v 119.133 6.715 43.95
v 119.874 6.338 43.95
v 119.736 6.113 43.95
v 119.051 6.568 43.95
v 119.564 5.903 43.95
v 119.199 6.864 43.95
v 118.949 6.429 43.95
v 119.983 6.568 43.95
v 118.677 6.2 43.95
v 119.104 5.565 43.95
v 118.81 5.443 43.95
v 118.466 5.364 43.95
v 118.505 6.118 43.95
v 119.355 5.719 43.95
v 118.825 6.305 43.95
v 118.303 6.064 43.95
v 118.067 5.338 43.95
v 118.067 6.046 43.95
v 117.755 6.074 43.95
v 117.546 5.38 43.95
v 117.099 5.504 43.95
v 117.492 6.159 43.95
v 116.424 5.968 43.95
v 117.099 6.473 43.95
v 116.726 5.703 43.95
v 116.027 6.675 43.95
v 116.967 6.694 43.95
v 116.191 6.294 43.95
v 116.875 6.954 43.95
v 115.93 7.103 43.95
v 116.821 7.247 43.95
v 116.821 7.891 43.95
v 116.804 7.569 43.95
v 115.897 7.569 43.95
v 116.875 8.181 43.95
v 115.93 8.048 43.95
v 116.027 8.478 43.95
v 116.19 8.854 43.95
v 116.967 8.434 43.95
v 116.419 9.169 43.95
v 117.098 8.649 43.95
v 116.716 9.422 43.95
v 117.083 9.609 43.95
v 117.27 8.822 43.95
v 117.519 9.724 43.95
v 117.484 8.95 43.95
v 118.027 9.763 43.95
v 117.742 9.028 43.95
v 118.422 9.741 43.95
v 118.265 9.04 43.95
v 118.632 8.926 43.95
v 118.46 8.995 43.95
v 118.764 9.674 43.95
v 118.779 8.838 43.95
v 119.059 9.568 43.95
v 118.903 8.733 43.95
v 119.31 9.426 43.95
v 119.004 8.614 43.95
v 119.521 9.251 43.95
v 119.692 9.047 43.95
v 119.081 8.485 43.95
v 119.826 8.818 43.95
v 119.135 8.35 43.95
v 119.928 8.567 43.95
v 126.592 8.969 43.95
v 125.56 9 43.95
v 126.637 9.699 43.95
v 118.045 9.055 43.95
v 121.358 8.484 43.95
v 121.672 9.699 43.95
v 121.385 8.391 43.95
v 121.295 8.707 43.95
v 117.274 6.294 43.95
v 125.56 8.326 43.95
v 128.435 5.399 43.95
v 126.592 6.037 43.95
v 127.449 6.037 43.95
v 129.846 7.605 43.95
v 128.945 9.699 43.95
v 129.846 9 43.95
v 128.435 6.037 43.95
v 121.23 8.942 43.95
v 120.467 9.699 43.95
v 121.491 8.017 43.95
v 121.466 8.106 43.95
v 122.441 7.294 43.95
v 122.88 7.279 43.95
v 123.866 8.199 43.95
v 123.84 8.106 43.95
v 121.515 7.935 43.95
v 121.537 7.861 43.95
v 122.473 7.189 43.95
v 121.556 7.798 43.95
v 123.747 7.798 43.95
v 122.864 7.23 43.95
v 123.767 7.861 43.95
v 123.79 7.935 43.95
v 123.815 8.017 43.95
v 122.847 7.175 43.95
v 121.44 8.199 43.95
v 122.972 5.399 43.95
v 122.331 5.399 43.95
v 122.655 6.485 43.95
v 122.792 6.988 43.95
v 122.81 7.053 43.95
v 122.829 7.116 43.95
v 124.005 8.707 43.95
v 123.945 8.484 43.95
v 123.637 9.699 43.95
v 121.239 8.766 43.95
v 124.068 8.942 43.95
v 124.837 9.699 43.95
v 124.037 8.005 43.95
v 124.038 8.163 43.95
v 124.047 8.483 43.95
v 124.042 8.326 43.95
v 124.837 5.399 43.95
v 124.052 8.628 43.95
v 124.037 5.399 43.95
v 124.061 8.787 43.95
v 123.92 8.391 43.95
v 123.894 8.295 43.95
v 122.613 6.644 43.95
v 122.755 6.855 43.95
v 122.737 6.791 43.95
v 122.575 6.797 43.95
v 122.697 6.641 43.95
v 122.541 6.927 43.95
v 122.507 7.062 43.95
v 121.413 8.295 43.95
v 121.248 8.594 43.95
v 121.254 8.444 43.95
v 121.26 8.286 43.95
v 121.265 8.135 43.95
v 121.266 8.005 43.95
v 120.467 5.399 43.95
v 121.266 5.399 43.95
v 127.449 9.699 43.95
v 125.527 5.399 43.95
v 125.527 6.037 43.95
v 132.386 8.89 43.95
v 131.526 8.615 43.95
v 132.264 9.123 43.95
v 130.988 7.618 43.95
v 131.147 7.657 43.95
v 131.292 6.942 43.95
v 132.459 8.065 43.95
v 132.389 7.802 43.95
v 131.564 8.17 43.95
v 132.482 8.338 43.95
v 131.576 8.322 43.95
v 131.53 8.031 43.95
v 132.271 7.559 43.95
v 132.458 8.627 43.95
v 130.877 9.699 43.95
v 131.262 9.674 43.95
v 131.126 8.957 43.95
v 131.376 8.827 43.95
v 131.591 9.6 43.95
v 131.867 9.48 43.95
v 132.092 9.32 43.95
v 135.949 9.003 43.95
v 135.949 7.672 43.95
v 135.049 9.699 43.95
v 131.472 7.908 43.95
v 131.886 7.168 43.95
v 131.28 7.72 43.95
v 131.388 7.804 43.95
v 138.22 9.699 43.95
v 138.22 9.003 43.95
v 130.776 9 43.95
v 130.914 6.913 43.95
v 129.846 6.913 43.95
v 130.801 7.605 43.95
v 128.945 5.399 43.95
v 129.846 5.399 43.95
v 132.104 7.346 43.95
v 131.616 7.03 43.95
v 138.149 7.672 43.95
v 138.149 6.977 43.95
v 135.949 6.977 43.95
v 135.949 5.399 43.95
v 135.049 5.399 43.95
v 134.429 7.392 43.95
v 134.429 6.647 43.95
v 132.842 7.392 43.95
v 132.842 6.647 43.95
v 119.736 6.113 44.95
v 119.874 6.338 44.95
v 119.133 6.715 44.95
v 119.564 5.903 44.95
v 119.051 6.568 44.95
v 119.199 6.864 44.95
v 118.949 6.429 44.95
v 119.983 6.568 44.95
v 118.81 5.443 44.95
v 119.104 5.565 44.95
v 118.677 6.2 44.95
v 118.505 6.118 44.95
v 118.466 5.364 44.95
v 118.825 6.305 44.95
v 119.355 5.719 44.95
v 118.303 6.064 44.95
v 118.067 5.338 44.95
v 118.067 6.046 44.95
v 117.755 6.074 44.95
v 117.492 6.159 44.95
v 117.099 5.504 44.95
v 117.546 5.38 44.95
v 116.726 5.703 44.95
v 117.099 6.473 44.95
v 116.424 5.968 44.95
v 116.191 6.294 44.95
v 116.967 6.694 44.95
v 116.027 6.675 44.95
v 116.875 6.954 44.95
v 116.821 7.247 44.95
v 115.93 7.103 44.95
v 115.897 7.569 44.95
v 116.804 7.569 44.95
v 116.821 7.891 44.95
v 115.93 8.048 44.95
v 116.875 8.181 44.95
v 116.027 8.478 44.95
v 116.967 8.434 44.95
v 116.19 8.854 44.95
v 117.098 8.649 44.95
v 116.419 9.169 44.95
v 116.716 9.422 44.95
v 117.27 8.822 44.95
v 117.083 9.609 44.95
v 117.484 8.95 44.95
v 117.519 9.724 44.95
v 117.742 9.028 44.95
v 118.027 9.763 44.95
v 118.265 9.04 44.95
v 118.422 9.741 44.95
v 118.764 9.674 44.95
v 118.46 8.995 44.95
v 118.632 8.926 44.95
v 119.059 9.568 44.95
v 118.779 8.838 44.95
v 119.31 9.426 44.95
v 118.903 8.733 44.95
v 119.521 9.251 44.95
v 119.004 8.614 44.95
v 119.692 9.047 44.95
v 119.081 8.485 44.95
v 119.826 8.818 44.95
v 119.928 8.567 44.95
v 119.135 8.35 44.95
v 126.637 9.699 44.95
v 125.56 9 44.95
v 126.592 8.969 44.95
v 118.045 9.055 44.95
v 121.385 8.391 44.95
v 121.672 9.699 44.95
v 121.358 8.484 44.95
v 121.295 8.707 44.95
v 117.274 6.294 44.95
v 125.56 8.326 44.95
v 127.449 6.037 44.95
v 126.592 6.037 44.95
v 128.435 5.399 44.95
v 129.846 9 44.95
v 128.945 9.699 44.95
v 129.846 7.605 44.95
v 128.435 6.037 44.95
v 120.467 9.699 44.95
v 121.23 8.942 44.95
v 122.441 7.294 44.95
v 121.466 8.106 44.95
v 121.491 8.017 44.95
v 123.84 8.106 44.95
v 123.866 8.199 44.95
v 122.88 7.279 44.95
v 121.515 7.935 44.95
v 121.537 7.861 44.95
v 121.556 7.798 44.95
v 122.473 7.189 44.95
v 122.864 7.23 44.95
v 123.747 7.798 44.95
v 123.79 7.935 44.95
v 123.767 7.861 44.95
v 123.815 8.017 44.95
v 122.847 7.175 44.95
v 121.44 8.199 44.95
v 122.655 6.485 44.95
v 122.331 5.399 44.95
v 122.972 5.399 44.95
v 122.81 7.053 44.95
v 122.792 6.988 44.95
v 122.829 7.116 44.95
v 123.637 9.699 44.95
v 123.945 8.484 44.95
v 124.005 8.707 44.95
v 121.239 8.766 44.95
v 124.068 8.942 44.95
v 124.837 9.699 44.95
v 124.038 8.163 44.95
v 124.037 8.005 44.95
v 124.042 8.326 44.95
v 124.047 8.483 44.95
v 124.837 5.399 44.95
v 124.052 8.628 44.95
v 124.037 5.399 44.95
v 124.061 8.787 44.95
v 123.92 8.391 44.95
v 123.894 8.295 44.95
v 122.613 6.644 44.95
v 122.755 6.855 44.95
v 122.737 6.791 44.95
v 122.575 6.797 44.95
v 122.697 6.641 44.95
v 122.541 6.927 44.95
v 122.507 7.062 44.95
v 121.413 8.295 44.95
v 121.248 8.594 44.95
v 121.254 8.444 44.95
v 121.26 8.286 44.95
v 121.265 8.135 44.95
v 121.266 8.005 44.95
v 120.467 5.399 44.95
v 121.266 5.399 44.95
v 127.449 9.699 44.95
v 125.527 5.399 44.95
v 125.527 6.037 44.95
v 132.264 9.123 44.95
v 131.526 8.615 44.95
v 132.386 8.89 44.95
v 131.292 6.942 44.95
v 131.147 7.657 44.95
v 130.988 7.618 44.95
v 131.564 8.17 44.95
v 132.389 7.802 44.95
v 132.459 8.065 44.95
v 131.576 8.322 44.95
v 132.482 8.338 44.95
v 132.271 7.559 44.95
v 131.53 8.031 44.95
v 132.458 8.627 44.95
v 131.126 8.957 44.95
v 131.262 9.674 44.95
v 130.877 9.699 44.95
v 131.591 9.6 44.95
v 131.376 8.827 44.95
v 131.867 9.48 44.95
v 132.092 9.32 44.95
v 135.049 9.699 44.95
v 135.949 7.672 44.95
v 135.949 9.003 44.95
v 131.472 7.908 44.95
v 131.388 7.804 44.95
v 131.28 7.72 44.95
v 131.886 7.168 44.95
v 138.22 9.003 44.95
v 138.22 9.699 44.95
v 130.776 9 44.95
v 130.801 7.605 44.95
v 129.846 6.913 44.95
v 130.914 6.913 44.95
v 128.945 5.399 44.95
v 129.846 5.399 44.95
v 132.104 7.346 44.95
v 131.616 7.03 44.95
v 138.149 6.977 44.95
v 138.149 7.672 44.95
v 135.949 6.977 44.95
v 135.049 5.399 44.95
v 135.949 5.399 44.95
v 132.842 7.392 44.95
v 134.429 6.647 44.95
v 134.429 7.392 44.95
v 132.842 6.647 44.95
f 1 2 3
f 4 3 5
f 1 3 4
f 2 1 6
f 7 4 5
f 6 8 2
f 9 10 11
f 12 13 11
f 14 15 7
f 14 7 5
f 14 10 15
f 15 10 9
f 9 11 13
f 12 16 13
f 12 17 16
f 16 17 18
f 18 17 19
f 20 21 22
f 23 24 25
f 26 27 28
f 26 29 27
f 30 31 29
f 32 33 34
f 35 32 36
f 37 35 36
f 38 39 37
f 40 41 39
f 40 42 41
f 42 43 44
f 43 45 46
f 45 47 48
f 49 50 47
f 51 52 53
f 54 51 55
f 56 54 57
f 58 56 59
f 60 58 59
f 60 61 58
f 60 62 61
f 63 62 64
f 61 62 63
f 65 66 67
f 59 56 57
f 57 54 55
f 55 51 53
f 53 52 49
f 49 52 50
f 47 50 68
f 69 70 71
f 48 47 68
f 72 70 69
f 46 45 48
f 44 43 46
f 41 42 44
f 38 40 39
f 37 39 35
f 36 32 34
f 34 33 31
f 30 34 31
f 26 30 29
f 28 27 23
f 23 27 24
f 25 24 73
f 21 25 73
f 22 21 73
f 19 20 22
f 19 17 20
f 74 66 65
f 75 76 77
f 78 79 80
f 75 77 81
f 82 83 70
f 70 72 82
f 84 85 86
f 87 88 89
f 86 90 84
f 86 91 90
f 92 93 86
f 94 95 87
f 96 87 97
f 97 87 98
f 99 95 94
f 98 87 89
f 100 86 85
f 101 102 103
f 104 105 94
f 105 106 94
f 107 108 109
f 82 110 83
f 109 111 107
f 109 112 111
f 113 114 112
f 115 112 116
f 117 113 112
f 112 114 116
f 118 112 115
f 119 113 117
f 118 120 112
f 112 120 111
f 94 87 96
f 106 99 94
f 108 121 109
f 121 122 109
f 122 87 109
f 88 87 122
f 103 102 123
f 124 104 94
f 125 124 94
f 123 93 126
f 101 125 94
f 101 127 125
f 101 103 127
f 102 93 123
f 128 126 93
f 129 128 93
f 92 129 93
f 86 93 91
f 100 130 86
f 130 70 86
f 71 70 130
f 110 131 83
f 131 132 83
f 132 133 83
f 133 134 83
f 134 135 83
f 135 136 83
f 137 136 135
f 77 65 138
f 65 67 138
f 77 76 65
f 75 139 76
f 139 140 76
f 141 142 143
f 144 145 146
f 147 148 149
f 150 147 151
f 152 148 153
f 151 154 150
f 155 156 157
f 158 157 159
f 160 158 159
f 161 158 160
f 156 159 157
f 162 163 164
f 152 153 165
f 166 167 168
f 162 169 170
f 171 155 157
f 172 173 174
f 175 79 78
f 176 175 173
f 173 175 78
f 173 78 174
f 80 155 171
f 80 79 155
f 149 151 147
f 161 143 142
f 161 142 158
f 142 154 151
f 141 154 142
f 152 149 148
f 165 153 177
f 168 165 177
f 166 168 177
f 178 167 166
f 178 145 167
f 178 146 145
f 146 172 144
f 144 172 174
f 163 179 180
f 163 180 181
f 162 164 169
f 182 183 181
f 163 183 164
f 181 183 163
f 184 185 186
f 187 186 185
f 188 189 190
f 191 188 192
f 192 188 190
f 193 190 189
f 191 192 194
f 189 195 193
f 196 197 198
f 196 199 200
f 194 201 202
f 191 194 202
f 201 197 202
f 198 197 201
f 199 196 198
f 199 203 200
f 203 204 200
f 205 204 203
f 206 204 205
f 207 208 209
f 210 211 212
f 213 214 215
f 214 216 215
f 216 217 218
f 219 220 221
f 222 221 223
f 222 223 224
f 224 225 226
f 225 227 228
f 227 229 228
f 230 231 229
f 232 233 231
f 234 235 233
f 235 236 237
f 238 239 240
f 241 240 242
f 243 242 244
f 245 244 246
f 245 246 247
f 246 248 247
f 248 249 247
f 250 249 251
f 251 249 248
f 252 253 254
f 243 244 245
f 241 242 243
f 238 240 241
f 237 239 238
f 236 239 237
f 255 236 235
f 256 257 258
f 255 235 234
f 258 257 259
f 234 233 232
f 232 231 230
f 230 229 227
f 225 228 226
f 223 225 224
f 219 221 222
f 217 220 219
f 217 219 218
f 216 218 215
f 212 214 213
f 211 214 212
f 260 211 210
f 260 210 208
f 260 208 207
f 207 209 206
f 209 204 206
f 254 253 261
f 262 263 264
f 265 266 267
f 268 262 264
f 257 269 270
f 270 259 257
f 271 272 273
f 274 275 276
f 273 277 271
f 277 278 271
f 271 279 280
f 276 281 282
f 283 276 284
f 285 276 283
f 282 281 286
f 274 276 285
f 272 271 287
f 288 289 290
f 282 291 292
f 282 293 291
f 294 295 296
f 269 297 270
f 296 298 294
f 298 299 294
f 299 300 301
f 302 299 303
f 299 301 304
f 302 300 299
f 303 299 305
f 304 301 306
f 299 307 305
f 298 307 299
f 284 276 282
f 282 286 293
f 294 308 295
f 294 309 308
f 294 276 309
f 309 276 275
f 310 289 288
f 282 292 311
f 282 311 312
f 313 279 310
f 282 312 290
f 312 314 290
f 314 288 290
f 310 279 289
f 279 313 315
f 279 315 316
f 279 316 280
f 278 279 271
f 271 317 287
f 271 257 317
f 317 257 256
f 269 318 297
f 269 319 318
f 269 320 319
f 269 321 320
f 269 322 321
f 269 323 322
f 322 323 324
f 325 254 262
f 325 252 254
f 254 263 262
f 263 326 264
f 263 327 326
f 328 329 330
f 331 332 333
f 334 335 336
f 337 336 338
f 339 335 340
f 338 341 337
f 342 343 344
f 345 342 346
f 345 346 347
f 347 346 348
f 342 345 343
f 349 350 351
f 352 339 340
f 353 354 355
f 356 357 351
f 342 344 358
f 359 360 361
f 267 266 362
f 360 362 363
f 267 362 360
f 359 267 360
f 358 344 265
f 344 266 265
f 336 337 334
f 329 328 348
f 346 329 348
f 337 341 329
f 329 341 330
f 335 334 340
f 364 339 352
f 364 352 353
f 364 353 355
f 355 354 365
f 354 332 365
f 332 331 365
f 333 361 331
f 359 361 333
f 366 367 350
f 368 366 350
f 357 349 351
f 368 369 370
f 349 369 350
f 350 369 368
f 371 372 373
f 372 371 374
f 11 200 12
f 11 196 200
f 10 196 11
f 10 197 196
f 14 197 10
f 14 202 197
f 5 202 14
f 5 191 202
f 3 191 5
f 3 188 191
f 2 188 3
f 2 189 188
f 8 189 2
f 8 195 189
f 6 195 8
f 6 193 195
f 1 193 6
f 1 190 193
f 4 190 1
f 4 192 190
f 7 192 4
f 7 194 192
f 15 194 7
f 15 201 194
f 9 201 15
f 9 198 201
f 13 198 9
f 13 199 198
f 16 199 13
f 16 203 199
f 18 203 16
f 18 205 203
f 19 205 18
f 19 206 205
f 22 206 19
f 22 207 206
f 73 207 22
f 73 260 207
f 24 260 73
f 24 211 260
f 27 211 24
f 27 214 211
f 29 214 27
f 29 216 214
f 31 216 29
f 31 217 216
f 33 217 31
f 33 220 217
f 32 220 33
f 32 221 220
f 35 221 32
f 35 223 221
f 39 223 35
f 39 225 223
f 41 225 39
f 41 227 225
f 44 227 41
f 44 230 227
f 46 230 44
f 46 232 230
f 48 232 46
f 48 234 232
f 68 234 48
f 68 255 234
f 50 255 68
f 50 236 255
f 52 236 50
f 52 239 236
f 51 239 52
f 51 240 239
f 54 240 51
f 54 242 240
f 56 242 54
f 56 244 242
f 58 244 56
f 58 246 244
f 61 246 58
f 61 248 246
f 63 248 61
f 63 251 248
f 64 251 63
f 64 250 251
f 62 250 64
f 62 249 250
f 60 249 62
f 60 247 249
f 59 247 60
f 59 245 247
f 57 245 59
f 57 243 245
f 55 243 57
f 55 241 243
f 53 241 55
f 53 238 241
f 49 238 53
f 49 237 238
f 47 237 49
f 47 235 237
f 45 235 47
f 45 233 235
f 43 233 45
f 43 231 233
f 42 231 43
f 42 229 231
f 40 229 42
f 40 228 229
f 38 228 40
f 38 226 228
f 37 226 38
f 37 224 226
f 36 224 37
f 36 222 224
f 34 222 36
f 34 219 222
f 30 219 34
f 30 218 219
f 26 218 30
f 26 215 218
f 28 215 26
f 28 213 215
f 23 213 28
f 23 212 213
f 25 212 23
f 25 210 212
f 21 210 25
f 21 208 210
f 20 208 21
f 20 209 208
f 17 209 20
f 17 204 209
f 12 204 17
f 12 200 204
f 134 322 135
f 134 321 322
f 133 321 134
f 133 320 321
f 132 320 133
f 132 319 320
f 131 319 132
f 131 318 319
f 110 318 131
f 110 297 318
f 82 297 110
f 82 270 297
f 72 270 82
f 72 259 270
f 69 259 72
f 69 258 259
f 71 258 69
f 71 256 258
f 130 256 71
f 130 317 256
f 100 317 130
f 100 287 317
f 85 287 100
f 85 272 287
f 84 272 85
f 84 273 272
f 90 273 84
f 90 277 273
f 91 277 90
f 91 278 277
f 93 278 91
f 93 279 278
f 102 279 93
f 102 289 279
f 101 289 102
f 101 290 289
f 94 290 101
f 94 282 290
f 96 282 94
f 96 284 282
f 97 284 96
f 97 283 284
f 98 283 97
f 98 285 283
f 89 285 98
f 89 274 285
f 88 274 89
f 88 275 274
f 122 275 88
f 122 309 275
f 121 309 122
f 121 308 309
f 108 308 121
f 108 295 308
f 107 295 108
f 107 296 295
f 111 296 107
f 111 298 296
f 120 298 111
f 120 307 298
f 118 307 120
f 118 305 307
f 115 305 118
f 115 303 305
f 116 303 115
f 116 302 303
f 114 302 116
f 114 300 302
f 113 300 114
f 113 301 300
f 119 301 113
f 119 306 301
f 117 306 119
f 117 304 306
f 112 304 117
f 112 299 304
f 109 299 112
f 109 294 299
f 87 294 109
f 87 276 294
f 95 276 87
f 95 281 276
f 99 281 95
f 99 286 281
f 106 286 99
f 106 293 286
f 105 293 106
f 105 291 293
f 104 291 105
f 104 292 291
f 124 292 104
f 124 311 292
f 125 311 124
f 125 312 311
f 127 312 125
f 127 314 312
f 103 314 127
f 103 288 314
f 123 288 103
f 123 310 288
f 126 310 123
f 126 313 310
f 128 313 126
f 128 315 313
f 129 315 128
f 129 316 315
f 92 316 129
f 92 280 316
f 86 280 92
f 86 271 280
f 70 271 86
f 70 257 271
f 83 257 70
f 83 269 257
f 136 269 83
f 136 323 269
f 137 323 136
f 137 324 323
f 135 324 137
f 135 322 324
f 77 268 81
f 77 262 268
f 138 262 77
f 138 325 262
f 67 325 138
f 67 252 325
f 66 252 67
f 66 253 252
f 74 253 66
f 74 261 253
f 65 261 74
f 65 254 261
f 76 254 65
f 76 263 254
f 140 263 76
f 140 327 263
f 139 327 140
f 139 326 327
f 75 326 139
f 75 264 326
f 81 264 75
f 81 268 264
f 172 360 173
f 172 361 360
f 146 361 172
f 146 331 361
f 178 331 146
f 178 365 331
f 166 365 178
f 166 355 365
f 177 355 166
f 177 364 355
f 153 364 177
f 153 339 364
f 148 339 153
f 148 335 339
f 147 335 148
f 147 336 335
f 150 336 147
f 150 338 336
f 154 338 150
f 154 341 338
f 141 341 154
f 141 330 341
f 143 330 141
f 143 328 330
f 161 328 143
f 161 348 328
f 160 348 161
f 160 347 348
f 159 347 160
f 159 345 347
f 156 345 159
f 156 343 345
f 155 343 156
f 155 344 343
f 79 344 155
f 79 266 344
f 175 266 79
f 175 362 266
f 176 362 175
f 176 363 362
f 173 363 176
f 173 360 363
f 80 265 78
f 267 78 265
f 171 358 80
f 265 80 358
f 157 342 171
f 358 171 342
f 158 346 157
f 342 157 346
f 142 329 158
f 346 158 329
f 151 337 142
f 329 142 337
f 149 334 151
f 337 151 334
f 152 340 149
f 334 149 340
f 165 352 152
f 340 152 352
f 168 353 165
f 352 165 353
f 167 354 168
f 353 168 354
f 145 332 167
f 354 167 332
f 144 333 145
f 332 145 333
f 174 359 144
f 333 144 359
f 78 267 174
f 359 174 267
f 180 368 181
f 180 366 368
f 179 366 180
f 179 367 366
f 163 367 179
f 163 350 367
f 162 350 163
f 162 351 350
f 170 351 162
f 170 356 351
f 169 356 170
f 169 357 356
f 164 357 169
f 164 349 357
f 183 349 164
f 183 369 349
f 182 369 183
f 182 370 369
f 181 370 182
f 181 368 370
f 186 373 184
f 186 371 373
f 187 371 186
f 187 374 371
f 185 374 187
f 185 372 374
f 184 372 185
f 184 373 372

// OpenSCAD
// CM1P-F ID text, engraved 0.5 into the plate's top face (frame as cm1p_f_freecad.py).
translate([127, 7.5, 43.95]) linear_extrude(1) text("CM1P-F", size = 4.5, font = "Liberation Sans:style=Bold", halign = "center", valign = "center");
